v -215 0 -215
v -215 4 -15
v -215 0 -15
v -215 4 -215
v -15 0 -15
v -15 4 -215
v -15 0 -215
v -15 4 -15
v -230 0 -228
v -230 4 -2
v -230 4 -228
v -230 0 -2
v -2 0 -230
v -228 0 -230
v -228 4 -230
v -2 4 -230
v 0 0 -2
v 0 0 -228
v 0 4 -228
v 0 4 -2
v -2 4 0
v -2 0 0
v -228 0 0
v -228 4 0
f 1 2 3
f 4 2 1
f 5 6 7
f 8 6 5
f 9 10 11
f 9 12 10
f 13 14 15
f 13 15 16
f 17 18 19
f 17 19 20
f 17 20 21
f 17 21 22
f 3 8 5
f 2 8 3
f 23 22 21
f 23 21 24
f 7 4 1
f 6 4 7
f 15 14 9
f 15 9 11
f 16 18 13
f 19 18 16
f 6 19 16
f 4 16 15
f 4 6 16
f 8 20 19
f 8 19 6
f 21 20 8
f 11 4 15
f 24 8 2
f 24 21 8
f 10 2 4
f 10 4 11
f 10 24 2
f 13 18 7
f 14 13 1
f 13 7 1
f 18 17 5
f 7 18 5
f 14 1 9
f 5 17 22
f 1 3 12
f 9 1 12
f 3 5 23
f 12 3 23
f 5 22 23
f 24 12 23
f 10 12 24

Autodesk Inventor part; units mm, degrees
ref_plane "YZ Plane" through (0, 0, 0) normal (1, 0, 0) x (0, 1, 0)
ref_plane "XZ Plane" through (0, 0, 0) normal (0, 1, 0) x (-1, 0, 0)
ref_plane "XY Plane" through (0, 0, 0) normal (0, 0, 1) x (1, 0, 0)
sketch "Sketch1" plane through (0, 0, 0) normal (0, 1, 0) x (-1, 0, 0)
  line L0 (0, 0) -> (230, 0)
  line L1 (230, 0) -> (230, -230)
  line L2 (230, -230) -> (0, -230)
  line L3 (0, -230) -> (0, 0)
  dimension "d0" = 230
  dimension "d1" = 230
extrude "Extrusion1" add sketch "Sketch1" along normal blind 4
chamfer "Chamfer1" distance 2 angle 45 4 edges at (-230, 2, 0) (-230, 2, -230) (0, 2, -230) (0, 2, 0)
sketch "Sketch5" plane through (0, 4, 0) normal (0, 1, 0) x (1, 0, 0)
  line L0 (-215, 215) -> (-15, 215)
  line L1 (-15, 215) -> (-15, 15)
  line L2 (-15, 15) -> (-215, 15)
  line L3 (-215, 15) -> (-215, 215)
  point P0 (0, 0)
  dimension "d29" = 200
  dimension "d30" = 200
  dimension "d31" = 15
  dimension "d32" = 15
extrude "Extrusion5" cut sketch "Sketch5" against normal through all
properties part number "MouldBase20"
